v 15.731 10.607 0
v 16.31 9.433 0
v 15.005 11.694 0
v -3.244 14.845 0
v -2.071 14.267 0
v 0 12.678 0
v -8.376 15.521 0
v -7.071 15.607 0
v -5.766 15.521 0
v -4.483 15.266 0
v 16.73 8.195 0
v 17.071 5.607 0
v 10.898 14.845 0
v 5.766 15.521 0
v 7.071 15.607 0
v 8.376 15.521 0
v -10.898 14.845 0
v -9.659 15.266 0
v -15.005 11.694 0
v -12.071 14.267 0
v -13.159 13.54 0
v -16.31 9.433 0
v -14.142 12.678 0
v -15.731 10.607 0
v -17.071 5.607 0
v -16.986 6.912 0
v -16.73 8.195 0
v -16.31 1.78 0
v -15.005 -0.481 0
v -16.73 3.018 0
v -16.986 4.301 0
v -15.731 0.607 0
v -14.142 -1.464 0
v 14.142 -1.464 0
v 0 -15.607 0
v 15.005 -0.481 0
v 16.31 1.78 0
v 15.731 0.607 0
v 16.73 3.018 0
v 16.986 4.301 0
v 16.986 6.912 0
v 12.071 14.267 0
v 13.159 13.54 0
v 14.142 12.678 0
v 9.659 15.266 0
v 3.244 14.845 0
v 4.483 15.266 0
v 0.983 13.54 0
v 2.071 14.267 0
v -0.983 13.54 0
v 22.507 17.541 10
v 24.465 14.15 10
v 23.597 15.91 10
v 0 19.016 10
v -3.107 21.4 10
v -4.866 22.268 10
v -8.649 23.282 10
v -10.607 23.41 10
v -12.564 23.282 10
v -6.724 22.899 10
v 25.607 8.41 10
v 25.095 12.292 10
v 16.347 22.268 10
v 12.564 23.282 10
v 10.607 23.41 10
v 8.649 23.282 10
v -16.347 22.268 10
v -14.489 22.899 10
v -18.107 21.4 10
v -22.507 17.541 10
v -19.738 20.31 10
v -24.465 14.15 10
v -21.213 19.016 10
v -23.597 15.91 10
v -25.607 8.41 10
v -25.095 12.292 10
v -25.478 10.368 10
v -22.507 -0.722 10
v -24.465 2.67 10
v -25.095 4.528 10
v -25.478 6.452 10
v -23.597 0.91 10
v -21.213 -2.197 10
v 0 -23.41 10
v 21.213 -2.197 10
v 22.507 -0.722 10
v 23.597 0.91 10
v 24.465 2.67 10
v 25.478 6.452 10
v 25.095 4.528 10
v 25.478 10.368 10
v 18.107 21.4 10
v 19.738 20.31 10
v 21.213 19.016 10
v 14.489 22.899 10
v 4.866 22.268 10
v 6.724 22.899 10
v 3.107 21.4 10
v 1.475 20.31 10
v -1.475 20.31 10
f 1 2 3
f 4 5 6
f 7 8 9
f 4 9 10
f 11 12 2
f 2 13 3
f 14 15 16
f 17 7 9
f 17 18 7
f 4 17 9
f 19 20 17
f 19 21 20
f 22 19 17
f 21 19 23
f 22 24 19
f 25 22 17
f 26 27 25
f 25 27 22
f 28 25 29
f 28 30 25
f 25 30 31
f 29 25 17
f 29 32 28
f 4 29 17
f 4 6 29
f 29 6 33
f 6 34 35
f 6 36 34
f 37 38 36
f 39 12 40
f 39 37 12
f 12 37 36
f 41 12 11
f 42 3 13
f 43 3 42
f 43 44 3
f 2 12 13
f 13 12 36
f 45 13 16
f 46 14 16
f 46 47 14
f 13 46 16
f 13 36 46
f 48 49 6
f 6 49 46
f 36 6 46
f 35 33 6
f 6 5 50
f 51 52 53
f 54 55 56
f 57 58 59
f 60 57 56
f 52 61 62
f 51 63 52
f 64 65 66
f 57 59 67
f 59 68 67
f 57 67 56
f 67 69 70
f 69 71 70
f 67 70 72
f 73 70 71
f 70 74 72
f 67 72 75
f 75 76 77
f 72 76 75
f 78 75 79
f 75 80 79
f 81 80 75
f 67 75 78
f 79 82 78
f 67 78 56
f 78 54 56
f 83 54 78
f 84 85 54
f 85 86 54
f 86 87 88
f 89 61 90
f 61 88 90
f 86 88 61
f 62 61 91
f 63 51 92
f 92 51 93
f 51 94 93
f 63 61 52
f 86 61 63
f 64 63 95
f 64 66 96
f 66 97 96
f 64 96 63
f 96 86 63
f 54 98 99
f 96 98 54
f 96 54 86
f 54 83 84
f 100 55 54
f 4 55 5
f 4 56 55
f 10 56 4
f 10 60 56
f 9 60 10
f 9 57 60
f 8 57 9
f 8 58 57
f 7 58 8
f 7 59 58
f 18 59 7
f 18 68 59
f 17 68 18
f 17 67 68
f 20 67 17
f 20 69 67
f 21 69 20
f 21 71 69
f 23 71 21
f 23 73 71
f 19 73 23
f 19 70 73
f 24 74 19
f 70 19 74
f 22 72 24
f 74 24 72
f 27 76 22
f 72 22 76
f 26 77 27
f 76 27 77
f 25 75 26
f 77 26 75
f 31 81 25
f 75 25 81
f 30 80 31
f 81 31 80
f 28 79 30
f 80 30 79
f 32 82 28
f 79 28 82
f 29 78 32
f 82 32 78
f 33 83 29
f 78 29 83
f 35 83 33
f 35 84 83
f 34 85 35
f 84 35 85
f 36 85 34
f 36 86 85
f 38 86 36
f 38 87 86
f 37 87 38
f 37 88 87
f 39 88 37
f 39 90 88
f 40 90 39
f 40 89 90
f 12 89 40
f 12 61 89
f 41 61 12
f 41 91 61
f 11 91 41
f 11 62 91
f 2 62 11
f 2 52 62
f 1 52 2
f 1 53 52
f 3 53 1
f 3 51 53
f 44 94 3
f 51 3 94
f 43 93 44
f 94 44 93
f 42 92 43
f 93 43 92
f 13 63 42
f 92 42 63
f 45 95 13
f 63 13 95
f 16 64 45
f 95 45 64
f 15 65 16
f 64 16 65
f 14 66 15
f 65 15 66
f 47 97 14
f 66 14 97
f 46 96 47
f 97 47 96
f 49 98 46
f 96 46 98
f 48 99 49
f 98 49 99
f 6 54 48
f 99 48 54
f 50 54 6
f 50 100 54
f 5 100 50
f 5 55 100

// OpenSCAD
Size = 210;

// Middle Cube Factor
MCF = .9;

// Inner Cube Factor
ICF = .8;

// Bevel Factor
BF = .03;

// Sphere Factor
SF = .8;

my_fn=30;
$fn=my_fn;


module model(){
//%translate([0,0,90])
//cube([210,210,210], center=true);
translate([0,0,80])
difference(){
  companion_cube();
  translate([0,0,Size/2]) 
    cube([Size+1,Size+1,Size+1], center=true);
  inner_size = Size*ICF-Size*BF-3;
  %translate([0,0,3])
    cube([inner_size-3,inner_size-3,inner_size-3], center=true);
//  %translate([0,0,3])
//    cube([inner_size,inner_size,inner_size], center=true);
}
translate([0,0,80])
    rotate([90,90,0])
      %translate([0,0,Size*ICF/2]) platform();
translate([0,0,65])
  cylinder(d=25, h=100);
}
//middle();
//four_glasses();

module companion_cube(type="middle"){
  difference(){
    union(){
        // Outer Cube
        difference(){
            union(){
                for(x = [-1,1]){
                    for(y=[-1,1]){
                        for(z = [-1,1]){
                            translate([x * Size/3,y * Size/3,z * Size/3])
                            cube([Size/3,Size/3,Size/3],center=true);
                        }
                    }
                }
                
            }
            // Bevels the inside edges
            for(plane = [[90,0,0],[0,90,0],[0,0,90]]){
                for(x = [-1,1]){
                    rotate(plane)
                    translate([x*Size/2, 0,0])
                    for(z = [0,90]){
                        rotate([0,z,90])
                        for(y = [-1,1]){
                            translate([y*Size/6,0,0])
                            rotate([0,0,45])
                            cube([Size*BF,Size*BF,Size*2], center=true);
                        }
                    }
                }
                
                // Bevels the outside edges
                rotate(plane)
                for(y =[-1,1]){
                    for(z = [-1,1]){
                        translate([z*Size/2,y*Size/2,0])
                        rotate([0,0,45])
                        cube([Size*BF,Size*BF,Size*2],center=true);
                    }
                }
            }
        }
    
        // Middle Cube
      if(type == "middle"){
        difference(){
            // Sets the size of the inside butt outs
            for(plane = [[90,0,0],[0,90,0],[0,0,90]]){
                rotate(plane)
                cube([Size*MCF,Size*MCF,Size*MCF/4],center=true);
            }
        
            // Bevels the inside edges
            for(plane = [[90,0,0],[0,90,0],[0,0,90]]){
                for(x = [-1,1]){
                    rotate(plane)
                    translate([x*Size*MCF/2, 0,0])
                    for(z = [0,90]){
                        rotate([0,z,90])
                        for(y = [-1,1]){
                            translate([y*Size*MCF/8,0,0])
                            rotate([0,0,45])
                            cube([Size*MCF*BF,Size*MCF*BF,Size*2], center=true);
                        }
                    }
                }
                
                // Bevels the outside edges
                rotate(plane)
                for(y =[-1,1]){
                    for(z = [-1,1]){
                        translate([z*Size*MCF/2,y*Size*MCF/2,0])
                        rotate([0,0,45])
                        cube([Size*MCF*BF,Size*MCF*BF,Size*2],center=true);
                    }
                }
            }
        }
      }
    }

    for(plane = [[90,0,0],[0,90,0],[0,0,90]]){
        for(x = [-1,1]){
            // creates the rounded insets
            rotate(plane)
            translate([x*Size*SF/4*3, 0,0])
            sphere(d = Size*SF);
        }
    }
}
  difference(){
    union(){
  // Inner Cube
  difference(){
    cube([Size*ICF,Size*ICF,Size*ICF],center=true);
    for(plane = [[90,0,0],[0,90,0],[0,0,90]]){
        rotate(plane)
        cube([Size, Size, Size*BF/3*2],center=true);
    }
  }

  // Inner Inner Cube
  color("grey")
  cube([Size*ICF-Size*BF,Size*ICF-Size*BF,Size*ICF-Size*BF],center=true);
    }
  }
  for(plane=[[0,0,-90], // top
             [90,90,0], // front 
             [90,90,90], // right
             [90,90,-90], // left
             [90,90,180], // back
             [0,180,30] // bottom
            ])
    rotate(plane)
      translate([0,0,Size*ICF/2]) platform();
}

module middle(){ // Middle Cube
  difference(){
    union(){
        difference(){
          cube([Size*MCF,Size*MCF,Size*MCF/4],center=true);
          cube([Size*ICF-Size*BF,Size*ICF-Size*BF,Size*MCF/4+1],center=true);
          // Bevels the inside edges
          for(plane = [[90,0,0],[0,90,0],[0,0,90]]){
                for(x = [-1,1]){
                    rotate(plane)
                    translate([x*Size*MCF/2, 0,0])
                    for(z = [0,90]){
                        rotate([0,z,90])
                        for(y = [-1,1]){
                            translate([y*Size*MCF/8,0,0])
                            rotate([0,0,45])
                            cube([Size*MCF*BF,Size*MCF*BF,Size*2], center=true);
                        }
                    }
                }
                
                // Bevels the outside edges
                rotate(plane)
                for(y =[-1,1]){
                    for(z = [-1,1]){
                        translate([z*Size*MCF/2,y*Size*MCF/2,0])
                        rotate([0,0,45])
                        cube([Size*MCF*BF,Size*MCF*BF,Size*2],center=true);
                    }
                }
            }
        }
    }

    for(R=[0,90,180,270]){
     // creates the rounded insets
       rotate([0,0,R])
       translate([Size*SF/4*3, 0,0])
         cylinder(d = Size*SF, h=Size*MCF/4+1, center=true);
    }
  }
}

module platform(height=5){ // Heart Platform
  hull(){
//  translate([0,0,Size*MCF/2])
    rotate_extrude($fn=my_fn*2)
      translate([Size*ICF/4-Size*ICF*BF/2,0,0])
        circle(d = Size*ICF*BF, $fn=my_fn*2);
    translate([0,0,-height])
      cylinder(d=Size*ICF/2, h=0.1, $fn=my_fn*2);
  }
  translate([0,0,-height/2])
  color("red") linear_extrude(height*2) heart(radius=Size*ICF/12, center=true);
}

//platform();
linear_extrude(10, scale=1.5) 
heart(radius=10, center=true);

module heart_sub_component(radius) {
    rotated_angle = 45;
    diameter = radius * 2;
    $fn = 48;

    translate([-radius * cos(rotated_angle), 0, 0]) 
        rotate(-rotated_angle) union() {
            circle(radius);
            translate([0, -radius, 0]) 
                square(diameter);
        }
}

module heart(radius, center = false) {
    offsetX = center ? 0 : radius + radius * cos(45);
    offsetY = center ? 1.5 * radius * sin(45) - 0.5 * radius : 3 * radius * sin(45);

    translate([offsetX, offsetY, 0]) union() {
        heart_sub_component(radius);
        mirror([1, 0, 0]) heart_sub_component(radius);
    }

}

module four_glasses(){
  for(X=[-1,1], Y=[-1,1])
    translate([40*X,40*Y,0])
      glass_cutout();
}

module glass_cutout(){
  translate([0,0,5]){
    cylinder(d=47, h=7);
    translate([0,0,7]) cylinder(d1=47, d2=69, h=68-7);
    translate([0,0,68]) cylinder(d=69, h=50);
  }
}
